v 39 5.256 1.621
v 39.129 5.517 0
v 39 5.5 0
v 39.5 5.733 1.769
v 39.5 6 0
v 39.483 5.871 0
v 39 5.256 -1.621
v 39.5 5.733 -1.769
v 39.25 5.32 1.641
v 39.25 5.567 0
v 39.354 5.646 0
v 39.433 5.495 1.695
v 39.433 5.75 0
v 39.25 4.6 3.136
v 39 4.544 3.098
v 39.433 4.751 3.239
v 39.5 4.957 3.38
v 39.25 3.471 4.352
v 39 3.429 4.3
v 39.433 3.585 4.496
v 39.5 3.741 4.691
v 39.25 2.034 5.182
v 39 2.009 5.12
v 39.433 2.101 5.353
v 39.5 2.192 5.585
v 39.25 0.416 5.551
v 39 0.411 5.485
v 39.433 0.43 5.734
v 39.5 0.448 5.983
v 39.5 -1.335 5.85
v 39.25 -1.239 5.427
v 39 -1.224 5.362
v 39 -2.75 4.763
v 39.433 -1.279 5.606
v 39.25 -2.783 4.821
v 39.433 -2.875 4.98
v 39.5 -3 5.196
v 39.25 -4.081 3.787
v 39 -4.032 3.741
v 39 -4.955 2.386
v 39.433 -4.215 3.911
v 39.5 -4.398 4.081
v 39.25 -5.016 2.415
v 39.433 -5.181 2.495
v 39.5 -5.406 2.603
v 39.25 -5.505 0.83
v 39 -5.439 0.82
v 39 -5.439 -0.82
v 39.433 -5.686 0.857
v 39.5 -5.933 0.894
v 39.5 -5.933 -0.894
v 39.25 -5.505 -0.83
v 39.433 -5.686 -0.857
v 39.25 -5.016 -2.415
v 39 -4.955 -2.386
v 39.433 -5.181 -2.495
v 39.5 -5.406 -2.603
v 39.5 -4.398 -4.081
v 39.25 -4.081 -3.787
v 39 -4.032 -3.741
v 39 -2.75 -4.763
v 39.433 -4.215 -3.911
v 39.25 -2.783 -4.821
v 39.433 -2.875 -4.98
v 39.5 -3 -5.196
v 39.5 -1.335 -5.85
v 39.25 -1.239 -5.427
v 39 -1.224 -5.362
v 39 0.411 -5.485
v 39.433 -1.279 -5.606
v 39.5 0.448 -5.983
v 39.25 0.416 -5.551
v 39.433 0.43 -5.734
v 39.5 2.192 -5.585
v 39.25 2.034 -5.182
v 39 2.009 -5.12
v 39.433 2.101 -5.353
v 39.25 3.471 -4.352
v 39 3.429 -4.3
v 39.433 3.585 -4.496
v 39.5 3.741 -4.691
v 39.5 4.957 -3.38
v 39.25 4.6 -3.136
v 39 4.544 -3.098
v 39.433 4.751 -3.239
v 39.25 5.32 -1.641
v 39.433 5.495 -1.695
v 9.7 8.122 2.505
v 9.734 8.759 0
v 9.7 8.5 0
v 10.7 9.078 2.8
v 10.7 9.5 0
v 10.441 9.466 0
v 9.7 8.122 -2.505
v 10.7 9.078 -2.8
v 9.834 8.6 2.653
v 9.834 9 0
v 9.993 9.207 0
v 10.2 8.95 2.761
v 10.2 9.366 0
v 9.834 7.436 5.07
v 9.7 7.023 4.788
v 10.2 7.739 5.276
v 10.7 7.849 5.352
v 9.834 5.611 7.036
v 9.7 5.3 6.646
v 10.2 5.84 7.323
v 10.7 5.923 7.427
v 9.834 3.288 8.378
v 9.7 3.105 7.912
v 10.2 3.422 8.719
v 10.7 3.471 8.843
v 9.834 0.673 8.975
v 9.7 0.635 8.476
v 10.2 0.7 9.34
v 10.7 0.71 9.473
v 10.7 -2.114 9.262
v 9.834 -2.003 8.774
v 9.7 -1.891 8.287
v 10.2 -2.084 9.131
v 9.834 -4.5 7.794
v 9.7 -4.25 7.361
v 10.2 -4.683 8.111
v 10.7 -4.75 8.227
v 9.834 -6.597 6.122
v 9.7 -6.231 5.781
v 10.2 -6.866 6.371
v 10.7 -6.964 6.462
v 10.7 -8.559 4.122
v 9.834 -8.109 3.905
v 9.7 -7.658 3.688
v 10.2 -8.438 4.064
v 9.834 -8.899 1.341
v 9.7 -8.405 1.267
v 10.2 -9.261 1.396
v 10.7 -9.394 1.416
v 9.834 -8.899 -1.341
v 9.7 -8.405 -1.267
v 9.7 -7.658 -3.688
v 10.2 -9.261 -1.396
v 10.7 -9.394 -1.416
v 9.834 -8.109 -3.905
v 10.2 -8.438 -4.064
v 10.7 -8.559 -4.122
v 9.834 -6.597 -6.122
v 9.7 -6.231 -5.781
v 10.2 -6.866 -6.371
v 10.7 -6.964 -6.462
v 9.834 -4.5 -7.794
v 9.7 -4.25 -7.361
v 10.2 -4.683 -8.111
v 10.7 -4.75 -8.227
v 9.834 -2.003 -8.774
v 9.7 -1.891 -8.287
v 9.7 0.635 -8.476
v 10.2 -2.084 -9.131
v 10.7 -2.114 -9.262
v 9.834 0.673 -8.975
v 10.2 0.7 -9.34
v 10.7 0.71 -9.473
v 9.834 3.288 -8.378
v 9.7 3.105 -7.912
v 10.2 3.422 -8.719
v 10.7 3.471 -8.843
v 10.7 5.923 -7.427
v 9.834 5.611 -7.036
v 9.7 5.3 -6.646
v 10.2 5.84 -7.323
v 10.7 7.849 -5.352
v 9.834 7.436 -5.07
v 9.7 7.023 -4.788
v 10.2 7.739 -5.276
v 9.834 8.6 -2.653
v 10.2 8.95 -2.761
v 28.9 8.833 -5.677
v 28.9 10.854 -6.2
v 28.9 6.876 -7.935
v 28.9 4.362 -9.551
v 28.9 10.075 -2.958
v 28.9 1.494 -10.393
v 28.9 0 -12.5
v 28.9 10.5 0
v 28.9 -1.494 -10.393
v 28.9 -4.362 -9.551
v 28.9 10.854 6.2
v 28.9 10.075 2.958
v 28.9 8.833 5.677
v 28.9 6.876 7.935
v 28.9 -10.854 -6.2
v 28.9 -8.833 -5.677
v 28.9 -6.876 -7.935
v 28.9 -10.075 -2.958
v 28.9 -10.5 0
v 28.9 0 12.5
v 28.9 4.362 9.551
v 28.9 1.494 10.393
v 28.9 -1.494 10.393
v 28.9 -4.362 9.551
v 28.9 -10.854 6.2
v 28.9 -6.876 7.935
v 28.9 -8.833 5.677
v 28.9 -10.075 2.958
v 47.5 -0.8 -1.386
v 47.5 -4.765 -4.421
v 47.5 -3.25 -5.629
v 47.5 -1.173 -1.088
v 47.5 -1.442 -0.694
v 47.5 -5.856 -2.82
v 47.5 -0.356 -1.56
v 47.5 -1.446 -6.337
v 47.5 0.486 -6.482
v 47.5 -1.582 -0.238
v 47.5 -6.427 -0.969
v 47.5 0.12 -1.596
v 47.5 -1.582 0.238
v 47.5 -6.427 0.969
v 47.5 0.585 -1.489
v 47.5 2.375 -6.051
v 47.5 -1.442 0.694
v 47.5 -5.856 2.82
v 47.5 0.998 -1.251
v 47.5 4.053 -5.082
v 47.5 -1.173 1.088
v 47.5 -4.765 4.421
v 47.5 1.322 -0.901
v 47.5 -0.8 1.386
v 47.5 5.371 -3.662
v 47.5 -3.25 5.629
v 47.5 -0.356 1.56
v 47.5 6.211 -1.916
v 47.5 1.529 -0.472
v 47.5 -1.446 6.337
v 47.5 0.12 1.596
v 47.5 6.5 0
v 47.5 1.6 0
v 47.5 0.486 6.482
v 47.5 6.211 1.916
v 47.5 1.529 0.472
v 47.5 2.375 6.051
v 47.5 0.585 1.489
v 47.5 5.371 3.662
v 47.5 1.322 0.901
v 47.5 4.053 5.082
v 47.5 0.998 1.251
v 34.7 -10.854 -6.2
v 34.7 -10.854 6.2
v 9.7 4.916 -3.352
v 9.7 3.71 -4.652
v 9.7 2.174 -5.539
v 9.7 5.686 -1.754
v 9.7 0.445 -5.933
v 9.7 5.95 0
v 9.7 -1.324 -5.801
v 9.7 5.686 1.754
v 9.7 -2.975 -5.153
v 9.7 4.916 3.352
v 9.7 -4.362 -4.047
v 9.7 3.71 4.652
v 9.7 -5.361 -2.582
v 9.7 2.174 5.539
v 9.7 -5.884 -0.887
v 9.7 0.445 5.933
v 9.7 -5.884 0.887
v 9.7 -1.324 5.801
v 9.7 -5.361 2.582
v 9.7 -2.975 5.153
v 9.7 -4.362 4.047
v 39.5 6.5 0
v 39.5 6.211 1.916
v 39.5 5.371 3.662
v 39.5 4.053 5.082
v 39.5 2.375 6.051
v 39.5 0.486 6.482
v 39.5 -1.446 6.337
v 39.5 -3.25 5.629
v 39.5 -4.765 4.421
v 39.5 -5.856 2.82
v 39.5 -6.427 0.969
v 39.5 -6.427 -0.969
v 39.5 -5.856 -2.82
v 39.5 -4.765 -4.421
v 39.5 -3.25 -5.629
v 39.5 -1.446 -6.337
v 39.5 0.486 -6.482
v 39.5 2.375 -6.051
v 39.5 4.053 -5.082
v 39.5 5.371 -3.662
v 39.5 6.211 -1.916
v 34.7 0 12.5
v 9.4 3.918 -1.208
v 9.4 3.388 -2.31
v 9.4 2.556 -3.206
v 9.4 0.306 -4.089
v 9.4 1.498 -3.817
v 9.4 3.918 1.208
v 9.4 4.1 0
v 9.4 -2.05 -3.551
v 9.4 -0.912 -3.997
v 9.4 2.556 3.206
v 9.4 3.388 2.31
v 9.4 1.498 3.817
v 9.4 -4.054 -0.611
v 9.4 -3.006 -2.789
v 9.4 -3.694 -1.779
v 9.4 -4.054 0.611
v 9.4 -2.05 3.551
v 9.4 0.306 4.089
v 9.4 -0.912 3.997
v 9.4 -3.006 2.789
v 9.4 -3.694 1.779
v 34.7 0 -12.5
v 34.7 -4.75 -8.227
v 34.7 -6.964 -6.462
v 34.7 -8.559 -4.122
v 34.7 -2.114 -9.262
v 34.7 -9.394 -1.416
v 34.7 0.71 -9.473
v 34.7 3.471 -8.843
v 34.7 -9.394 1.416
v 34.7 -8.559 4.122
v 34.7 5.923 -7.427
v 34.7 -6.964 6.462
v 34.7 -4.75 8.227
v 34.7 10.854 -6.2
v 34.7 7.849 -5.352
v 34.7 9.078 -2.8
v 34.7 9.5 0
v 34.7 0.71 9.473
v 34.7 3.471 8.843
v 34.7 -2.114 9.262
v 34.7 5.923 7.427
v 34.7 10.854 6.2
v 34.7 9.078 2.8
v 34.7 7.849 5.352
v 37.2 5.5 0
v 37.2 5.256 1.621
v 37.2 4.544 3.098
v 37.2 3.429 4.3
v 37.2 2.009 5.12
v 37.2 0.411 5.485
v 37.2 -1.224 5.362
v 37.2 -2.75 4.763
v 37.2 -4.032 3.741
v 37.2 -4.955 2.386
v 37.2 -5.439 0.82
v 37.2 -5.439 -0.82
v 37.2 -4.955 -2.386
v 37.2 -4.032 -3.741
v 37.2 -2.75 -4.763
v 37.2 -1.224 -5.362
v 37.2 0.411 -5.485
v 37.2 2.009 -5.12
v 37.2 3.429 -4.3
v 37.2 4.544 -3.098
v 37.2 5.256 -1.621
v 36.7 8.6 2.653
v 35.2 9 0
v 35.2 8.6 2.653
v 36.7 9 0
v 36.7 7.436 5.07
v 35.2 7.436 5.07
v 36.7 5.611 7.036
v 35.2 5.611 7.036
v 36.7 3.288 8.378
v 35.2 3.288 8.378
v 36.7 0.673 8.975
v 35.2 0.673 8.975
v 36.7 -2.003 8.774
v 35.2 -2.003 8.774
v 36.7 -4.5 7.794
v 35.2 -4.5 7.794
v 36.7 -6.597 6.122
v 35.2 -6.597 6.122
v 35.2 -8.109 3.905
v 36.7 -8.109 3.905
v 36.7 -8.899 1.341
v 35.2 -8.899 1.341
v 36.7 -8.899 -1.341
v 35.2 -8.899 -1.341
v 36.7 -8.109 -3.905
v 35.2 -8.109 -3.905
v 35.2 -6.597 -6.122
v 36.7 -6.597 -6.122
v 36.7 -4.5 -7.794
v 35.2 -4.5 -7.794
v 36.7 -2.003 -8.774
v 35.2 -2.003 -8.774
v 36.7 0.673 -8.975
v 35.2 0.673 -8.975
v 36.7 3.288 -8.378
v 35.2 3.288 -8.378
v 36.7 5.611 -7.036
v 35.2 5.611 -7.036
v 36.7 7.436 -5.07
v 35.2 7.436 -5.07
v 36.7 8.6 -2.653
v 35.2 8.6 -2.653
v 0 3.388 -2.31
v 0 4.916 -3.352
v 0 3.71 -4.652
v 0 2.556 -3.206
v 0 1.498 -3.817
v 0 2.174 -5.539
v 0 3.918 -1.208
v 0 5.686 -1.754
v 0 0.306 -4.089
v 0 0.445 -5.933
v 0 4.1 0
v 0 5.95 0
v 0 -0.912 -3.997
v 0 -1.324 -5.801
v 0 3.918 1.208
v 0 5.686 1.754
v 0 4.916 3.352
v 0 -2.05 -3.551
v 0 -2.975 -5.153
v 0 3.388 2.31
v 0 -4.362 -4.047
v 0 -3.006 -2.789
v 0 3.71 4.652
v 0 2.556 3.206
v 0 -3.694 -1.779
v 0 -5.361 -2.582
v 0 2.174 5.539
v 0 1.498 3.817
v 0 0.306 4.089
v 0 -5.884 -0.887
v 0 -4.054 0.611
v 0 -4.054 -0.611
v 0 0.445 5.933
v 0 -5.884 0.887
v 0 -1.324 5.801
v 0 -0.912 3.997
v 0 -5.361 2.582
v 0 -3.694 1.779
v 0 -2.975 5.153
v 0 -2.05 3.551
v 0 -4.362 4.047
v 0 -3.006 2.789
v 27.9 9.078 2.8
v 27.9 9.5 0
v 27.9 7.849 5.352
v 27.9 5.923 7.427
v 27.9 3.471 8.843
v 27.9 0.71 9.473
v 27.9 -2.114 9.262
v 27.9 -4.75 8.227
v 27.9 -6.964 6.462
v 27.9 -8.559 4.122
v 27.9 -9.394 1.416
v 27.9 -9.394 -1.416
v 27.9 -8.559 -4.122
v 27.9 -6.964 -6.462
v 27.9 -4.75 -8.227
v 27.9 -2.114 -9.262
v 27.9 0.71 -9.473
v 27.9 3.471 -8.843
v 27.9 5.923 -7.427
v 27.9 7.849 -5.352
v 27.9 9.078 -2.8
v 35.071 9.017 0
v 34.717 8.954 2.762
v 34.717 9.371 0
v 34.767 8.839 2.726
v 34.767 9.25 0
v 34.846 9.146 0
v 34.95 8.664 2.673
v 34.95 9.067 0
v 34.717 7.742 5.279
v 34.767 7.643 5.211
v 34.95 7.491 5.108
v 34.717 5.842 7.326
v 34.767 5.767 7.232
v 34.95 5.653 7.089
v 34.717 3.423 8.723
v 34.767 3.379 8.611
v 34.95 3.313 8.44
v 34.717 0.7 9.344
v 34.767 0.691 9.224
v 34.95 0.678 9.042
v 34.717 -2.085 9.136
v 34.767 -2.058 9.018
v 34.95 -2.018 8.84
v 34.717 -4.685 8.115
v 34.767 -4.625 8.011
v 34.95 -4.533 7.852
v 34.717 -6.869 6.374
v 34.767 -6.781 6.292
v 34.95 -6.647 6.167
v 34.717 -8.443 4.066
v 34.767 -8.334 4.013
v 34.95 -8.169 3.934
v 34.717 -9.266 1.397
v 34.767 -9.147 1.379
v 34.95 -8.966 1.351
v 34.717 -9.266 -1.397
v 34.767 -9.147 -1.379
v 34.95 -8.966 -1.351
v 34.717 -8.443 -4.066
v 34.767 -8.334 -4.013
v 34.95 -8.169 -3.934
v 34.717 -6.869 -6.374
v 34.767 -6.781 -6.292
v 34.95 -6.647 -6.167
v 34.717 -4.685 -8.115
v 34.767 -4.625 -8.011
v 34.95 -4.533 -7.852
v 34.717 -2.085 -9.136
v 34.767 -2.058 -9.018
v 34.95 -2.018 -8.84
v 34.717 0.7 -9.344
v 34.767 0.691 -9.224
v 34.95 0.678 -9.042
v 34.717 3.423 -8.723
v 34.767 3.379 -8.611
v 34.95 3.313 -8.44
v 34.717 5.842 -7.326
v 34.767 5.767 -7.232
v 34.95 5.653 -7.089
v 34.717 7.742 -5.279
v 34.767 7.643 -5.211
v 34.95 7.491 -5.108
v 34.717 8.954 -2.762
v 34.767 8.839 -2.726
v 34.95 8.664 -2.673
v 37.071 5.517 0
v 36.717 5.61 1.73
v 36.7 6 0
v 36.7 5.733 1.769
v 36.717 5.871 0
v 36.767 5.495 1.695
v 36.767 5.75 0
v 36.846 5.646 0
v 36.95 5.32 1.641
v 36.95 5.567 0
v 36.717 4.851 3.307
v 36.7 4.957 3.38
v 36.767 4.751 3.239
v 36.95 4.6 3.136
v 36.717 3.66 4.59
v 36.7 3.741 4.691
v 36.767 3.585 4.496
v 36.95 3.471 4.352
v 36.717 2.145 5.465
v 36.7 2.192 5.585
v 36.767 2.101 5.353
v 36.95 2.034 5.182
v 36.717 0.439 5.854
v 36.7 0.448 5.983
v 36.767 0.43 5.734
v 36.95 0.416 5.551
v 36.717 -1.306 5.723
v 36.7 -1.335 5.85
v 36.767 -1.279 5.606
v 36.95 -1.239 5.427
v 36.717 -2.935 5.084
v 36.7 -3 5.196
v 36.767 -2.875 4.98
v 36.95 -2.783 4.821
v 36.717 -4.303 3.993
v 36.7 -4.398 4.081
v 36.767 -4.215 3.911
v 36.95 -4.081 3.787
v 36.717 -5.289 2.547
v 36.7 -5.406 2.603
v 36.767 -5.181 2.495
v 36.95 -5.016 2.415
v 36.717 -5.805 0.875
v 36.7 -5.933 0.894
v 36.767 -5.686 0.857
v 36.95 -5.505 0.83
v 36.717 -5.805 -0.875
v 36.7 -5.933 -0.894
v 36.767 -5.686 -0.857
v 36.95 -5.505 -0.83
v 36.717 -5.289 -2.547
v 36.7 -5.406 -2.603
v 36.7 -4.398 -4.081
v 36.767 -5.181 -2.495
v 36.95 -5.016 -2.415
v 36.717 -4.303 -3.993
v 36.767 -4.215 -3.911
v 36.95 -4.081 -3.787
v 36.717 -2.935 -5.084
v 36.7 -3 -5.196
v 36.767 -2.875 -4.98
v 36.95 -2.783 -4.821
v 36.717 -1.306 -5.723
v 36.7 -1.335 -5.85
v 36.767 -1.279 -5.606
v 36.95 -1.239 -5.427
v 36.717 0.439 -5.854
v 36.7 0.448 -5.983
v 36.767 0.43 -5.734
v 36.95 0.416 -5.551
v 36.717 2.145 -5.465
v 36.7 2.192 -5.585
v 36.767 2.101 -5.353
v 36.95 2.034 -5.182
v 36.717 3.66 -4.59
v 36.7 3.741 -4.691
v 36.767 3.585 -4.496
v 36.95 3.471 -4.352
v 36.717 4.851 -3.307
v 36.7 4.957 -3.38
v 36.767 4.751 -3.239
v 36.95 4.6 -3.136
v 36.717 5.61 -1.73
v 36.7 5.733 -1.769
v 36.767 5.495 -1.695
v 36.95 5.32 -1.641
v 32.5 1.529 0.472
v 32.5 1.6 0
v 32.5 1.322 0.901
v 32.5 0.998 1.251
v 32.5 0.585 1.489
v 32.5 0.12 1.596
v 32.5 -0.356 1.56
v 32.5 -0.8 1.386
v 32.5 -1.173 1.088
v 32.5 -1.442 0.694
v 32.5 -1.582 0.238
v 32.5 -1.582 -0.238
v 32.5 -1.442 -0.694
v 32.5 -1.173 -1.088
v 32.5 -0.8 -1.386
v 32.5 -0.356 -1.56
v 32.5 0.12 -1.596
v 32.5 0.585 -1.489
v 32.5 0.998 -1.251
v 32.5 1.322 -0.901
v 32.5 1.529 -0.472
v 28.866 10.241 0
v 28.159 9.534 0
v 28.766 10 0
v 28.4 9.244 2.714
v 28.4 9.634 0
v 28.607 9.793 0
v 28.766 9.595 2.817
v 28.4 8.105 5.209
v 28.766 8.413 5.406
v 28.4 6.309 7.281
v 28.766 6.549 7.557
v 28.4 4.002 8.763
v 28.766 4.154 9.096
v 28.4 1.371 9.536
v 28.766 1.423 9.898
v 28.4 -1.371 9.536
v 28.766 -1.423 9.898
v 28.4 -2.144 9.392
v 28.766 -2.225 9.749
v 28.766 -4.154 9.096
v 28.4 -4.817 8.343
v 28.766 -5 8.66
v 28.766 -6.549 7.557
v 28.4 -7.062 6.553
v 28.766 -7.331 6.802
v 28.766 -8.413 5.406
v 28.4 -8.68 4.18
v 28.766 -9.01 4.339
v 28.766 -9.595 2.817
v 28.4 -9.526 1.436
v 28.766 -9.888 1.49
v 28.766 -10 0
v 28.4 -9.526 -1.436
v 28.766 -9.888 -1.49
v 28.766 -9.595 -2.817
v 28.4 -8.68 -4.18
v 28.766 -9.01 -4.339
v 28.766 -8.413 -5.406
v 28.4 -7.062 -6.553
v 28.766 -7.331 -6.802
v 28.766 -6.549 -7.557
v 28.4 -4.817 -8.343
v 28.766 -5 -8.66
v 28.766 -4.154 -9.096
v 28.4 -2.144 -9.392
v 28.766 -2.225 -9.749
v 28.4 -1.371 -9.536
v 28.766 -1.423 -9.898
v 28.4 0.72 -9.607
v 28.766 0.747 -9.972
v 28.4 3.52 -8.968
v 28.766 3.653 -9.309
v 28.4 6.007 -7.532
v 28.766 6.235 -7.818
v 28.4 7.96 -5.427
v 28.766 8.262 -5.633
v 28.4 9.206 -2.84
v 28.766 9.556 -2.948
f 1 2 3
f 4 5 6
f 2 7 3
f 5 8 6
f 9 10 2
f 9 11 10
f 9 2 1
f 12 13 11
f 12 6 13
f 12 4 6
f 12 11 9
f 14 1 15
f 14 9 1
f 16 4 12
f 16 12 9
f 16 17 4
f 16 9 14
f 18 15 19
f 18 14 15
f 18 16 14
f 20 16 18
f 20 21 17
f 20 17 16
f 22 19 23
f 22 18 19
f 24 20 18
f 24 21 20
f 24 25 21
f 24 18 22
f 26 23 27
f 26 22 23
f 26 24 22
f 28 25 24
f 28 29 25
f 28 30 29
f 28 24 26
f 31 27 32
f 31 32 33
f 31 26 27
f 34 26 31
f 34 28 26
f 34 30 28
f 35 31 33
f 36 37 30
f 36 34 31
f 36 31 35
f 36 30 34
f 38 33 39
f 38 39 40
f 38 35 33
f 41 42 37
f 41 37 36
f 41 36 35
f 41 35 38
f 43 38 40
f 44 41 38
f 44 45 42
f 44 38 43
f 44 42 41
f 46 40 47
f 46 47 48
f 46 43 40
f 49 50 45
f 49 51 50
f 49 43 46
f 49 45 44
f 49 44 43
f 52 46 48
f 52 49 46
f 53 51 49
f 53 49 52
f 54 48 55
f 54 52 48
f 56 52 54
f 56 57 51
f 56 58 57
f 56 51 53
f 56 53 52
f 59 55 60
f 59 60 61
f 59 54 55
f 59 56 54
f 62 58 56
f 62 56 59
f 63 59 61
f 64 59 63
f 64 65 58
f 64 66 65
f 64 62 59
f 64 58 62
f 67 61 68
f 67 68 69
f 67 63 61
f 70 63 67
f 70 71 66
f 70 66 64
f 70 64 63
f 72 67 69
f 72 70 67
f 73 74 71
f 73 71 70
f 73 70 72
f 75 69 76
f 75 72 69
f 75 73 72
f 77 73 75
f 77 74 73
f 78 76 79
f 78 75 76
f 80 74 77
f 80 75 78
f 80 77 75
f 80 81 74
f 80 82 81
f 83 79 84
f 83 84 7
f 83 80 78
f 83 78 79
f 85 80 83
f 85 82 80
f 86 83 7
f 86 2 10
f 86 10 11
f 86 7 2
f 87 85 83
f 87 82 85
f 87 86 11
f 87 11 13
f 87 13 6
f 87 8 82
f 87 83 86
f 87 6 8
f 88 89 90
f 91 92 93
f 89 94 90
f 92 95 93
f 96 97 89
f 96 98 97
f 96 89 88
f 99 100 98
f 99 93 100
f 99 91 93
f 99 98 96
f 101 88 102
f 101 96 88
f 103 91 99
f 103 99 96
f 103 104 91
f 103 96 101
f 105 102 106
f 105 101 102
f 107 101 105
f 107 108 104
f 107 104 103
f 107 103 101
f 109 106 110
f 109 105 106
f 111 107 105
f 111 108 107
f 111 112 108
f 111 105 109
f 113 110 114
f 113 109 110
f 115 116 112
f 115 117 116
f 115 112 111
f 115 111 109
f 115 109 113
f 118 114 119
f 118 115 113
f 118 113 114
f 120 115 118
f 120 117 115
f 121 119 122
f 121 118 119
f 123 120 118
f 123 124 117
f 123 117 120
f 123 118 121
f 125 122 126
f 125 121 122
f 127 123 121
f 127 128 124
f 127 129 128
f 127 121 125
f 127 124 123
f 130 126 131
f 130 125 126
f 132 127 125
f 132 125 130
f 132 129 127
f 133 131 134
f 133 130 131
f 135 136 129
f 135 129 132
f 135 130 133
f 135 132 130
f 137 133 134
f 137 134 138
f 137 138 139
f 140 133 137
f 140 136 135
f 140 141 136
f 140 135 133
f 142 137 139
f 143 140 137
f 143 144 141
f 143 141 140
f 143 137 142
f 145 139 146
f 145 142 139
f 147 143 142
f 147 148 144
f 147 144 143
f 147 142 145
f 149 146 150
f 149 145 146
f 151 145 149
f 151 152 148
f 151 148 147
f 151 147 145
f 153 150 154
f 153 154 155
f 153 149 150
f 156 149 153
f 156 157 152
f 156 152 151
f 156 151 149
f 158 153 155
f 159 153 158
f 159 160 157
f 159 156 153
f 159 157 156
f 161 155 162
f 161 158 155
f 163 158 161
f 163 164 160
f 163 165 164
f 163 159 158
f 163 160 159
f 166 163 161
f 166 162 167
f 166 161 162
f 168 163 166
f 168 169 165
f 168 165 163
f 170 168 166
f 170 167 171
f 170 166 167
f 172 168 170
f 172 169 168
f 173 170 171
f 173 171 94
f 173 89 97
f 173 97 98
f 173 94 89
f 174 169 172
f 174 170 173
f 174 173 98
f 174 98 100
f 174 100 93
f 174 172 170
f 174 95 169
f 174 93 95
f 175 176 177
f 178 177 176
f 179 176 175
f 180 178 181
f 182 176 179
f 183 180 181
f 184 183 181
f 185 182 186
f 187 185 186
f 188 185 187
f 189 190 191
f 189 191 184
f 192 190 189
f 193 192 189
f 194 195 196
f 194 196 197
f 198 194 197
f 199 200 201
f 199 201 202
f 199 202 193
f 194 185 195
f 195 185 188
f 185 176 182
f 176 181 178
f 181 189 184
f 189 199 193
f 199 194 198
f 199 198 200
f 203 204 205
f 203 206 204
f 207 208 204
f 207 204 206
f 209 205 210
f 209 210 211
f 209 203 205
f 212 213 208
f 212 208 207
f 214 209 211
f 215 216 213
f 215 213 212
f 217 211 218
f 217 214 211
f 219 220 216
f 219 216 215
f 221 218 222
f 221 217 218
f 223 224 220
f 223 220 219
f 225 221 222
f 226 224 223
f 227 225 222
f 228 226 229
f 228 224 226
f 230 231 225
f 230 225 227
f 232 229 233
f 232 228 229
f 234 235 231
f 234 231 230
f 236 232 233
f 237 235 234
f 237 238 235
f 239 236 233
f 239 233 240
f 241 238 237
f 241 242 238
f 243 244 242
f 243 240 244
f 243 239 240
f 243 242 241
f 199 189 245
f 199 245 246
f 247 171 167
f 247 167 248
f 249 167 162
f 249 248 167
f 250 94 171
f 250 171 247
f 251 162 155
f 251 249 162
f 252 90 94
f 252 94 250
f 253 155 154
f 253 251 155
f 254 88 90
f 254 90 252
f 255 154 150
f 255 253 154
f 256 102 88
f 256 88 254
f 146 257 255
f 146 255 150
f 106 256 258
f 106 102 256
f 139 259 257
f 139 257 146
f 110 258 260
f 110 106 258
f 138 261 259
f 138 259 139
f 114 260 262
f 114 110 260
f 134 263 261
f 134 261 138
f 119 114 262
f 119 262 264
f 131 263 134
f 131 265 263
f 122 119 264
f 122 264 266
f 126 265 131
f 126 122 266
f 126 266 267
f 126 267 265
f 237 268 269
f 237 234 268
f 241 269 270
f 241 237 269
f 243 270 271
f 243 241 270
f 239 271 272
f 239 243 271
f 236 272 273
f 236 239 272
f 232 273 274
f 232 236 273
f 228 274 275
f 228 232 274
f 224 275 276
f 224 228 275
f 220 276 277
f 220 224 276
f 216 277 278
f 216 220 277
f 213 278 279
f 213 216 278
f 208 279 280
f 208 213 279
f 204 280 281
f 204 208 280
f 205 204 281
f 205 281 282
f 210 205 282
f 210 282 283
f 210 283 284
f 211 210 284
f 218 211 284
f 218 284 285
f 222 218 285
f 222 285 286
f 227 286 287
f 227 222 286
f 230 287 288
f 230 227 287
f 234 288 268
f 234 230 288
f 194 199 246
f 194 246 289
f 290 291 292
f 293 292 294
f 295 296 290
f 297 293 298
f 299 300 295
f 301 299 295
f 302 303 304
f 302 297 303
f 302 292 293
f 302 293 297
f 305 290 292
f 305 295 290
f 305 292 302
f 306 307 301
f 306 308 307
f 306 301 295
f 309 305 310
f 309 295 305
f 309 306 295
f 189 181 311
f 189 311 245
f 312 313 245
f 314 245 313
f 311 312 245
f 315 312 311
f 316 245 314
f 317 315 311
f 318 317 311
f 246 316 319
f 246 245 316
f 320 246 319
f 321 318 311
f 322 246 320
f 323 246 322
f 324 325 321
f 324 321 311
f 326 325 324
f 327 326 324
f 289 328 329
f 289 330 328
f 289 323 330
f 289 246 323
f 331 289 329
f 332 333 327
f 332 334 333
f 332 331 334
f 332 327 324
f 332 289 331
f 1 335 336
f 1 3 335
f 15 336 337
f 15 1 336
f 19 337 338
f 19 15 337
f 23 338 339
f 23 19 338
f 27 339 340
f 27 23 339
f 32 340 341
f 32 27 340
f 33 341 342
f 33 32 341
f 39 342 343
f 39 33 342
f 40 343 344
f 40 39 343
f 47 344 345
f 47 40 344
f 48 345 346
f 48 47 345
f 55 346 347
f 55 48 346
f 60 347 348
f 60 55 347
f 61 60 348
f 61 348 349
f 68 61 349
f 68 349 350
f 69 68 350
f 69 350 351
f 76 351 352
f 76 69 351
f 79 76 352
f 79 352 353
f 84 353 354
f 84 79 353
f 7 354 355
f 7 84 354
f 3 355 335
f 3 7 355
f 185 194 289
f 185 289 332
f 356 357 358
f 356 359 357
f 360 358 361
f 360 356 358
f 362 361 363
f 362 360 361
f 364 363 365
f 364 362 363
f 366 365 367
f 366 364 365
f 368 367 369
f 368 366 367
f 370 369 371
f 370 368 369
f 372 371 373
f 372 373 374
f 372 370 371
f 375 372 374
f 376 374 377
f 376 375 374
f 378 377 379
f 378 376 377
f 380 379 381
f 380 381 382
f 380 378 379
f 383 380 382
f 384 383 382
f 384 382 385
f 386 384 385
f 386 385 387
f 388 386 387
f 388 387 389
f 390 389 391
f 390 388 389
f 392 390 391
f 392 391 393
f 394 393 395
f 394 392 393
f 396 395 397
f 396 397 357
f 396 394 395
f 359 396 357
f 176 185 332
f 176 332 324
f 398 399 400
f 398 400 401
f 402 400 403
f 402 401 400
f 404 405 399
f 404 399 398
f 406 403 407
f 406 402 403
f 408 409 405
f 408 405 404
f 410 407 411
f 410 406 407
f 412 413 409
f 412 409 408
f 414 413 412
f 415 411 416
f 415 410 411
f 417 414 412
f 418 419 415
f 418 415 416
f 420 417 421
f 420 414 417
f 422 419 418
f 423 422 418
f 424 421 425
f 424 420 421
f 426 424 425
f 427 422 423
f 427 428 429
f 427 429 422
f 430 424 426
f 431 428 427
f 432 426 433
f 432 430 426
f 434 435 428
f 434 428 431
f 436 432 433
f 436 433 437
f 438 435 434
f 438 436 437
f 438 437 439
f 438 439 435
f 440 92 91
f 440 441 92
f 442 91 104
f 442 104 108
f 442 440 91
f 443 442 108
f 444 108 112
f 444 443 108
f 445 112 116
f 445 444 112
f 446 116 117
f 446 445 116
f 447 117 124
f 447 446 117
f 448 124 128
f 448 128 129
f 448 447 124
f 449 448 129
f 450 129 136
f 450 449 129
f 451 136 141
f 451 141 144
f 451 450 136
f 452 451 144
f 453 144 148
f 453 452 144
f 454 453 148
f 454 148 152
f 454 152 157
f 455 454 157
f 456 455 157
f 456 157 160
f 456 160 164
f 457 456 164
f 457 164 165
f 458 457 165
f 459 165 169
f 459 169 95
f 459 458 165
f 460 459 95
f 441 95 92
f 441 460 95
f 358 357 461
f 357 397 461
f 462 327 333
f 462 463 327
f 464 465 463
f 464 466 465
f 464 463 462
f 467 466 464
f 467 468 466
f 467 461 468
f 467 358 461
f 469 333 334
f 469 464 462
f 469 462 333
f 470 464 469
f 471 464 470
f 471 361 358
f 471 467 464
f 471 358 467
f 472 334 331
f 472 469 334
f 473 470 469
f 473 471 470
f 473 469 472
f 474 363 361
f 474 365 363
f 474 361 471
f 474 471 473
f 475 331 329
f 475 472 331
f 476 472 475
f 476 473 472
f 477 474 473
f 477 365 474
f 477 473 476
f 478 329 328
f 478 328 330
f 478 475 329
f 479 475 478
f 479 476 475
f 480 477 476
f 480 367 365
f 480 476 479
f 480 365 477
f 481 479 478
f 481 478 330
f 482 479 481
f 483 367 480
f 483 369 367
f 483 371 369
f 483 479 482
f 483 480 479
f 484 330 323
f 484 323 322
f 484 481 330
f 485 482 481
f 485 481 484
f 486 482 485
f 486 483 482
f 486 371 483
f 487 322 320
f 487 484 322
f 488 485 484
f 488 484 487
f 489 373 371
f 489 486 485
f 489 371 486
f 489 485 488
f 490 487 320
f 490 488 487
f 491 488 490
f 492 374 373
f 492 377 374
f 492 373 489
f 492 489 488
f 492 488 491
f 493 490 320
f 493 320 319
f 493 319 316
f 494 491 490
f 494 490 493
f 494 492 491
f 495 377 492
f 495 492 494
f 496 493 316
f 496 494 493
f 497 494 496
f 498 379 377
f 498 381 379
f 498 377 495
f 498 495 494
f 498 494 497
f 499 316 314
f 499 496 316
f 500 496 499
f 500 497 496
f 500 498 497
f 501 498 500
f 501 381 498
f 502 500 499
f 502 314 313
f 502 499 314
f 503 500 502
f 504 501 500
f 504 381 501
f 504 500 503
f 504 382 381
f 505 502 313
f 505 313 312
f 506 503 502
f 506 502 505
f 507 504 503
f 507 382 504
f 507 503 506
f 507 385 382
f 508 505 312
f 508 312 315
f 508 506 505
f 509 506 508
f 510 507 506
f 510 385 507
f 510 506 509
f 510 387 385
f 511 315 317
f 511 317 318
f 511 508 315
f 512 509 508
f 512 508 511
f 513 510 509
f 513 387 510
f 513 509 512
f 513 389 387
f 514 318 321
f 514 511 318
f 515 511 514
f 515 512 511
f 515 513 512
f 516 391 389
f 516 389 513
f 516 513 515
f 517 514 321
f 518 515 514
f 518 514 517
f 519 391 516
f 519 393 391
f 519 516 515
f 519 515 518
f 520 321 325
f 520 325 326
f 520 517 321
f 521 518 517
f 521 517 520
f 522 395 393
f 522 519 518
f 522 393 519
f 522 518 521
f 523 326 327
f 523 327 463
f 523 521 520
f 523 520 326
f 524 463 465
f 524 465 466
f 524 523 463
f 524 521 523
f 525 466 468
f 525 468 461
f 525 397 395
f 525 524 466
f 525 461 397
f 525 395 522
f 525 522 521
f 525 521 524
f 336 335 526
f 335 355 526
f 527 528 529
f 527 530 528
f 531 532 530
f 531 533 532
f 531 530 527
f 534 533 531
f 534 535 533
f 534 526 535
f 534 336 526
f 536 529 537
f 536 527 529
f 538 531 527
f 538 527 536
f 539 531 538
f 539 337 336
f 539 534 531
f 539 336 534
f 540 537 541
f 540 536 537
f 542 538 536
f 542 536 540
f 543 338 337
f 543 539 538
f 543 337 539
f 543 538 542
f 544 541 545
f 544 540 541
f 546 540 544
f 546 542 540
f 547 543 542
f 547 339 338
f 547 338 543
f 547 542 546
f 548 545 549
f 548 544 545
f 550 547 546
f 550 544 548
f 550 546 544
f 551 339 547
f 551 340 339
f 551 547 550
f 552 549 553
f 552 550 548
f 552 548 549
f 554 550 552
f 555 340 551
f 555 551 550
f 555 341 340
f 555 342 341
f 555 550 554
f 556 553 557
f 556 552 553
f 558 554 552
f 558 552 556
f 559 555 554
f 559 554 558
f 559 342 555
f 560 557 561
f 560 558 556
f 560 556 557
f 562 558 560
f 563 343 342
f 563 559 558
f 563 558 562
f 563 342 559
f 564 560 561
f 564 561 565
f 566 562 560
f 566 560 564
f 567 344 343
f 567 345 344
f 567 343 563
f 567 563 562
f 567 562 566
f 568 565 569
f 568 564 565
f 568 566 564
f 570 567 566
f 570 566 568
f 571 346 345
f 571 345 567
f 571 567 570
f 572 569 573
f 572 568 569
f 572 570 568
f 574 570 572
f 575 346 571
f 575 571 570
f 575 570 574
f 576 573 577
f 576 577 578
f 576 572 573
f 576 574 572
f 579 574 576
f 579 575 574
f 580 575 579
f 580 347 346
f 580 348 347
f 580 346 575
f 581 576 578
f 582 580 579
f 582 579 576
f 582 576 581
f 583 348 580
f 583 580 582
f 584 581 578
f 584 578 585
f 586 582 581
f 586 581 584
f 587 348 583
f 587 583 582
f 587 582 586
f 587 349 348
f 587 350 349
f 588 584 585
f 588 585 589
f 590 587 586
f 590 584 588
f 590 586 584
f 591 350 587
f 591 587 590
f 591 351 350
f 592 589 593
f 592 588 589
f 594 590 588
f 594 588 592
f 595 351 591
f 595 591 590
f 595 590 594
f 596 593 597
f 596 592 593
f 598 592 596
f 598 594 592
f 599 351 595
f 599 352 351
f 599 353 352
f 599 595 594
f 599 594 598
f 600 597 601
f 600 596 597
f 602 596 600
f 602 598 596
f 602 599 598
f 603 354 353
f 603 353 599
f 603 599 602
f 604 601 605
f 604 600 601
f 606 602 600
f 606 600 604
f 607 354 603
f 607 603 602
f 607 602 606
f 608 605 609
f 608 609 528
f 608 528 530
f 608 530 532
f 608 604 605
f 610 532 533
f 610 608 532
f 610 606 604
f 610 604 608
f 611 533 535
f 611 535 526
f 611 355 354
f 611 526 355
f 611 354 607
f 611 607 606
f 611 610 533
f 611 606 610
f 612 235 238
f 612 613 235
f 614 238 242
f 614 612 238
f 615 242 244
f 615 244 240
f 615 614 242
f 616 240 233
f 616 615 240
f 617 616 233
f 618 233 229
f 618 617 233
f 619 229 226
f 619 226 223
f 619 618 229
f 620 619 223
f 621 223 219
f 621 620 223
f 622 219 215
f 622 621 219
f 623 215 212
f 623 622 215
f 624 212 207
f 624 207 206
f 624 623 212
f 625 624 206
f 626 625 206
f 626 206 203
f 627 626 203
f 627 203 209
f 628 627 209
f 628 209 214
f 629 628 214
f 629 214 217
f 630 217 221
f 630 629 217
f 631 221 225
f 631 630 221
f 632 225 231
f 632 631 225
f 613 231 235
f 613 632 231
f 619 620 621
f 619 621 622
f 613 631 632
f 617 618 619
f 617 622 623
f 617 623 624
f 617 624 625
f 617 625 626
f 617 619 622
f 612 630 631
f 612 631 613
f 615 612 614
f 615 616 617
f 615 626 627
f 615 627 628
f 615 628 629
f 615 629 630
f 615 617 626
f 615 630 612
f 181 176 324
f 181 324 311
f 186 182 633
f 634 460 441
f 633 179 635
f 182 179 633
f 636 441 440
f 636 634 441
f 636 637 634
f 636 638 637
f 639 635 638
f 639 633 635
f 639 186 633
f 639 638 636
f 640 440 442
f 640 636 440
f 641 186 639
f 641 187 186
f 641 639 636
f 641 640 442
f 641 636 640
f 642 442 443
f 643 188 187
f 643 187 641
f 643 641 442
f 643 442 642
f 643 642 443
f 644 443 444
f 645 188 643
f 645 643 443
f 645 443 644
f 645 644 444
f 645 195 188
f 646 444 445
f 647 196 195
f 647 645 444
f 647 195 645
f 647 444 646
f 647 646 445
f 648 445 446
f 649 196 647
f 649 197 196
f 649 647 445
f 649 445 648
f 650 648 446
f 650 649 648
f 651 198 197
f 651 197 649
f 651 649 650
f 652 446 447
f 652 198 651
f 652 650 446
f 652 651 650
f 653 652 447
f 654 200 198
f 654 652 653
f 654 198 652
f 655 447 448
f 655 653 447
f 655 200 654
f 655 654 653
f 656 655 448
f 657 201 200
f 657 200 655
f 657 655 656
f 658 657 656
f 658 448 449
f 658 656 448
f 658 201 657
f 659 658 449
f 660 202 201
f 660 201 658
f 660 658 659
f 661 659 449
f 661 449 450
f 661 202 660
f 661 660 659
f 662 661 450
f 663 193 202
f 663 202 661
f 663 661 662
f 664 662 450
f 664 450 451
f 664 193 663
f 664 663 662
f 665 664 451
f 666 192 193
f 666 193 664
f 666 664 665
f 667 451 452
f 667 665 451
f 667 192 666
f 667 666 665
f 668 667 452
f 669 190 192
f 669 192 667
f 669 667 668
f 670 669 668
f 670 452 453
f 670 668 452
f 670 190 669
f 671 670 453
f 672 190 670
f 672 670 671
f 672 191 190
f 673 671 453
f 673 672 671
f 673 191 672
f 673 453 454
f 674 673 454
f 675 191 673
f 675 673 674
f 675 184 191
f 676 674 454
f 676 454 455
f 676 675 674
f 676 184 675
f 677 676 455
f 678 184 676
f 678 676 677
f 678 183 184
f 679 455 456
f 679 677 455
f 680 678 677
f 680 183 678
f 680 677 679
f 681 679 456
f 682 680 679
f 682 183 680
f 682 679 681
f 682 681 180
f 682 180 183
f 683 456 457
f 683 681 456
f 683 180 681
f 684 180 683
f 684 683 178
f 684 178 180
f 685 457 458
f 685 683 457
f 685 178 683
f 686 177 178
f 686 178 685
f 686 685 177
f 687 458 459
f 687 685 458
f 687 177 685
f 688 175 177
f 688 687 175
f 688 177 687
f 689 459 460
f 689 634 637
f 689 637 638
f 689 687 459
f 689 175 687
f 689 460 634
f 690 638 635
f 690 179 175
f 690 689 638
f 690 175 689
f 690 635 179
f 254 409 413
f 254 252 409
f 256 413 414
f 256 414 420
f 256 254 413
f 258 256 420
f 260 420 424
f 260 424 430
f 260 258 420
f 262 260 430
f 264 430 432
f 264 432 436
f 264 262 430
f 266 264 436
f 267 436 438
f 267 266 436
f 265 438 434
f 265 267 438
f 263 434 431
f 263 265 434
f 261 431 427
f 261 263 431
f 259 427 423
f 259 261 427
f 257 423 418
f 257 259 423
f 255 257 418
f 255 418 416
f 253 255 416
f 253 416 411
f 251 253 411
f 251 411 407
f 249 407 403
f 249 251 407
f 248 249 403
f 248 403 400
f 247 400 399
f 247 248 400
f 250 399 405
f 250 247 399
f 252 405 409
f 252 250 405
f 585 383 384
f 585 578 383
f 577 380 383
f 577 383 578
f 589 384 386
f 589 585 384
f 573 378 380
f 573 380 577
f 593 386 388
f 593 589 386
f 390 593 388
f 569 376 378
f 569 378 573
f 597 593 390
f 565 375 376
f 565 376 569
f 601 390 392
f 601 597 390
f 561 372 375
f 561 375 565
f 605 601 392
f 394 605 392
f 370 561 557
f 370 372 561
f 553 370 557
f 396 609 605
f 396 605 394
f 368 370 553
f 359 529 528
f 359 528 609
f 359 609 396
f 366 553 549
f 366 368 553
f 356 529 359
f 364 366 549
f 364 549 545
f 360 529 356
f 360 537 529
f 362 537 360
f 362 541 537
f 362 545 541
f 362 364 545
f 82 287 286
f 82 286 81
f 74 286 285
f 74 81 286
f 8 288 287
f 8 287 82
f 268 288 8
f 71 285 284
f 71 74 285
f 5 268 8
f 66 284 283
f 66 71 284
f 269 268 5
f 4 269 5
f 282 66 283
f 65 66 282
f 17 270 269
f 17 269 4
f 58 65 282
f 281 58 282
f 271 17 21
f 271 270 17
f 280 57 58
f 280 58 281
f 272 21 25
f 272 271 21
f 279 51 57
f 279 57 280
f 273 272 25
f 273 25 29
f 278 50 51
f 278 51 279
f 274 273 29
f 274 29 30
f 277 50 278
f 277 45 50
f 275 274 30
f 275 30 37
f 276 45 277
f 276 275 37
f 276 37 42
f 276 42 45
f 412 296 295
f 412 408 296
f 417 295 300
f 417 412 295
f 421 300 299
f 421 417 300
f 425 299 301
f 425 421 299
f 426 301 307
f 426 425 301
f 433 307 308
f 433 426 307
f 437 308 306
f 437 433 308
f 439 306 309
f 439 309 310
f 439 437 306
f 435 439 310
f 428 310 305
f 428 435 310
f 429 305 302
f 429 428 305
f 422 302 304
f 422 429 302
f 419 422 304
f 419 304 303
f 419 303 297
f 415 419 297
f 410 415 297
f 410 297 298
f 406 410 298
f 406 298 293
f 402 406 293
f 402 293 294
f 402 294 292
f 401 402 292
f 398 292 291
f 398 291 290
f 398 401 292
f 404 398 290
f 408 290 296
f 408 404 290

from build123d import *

# Parameters (mm, degrees)
SKETCH2_OUTSIDE_W  = 38.842
SKETCH2_OUTSIDE_H  = 38.842
CUT_EXTRUDE1_DEPTH = 5.8


with BuildPart() as part:
    # Sketch1 → Revolve1 (revolve)
    with BuildSketch(Plane.XY):
        with BuildLine():
            Line((0, 4.1), (0, 5.95))
            Line((0, 5.95), (9.7, 5.95))
            Line((9.7, 5.95), (9.7, 8.5))
            ThreePointArc((9.7, 8.5), (9.992893219, 9.207106781), (10.7, 9.5))
            Line((10.7, 9.5), (27.9, 9.5))
            ThreePointArc((27.9, 9.5), (28.607106781, 9.792893219), (28.9, 10.5))
            Line((28.9, 10.5), (28.9, 12.5))
            Line((28.9, 12.5), (34.7, 12.5))
            Line((34.7, 12.5), (34.7, 9.5))
            ThreePointArc((34.7, 9.5), (34.846446609, 9.146446609), (35.2, 9))
            Line((35.2, 9), (36.7, 9))
            Line((36.7, 9), (36.7, 6.5))
            Line((36.7, 6.5), (36.7, 6))
            ThreePointArc((36.7, 6), (36.846446609, 5.646446609), (37.2, 5.5))
            Line((37.2, 5.5), (39, 5.5))
            ThreePointArc((39, 5.5), (39.353553391, 5.646446609), (39.5, 6))
            Line((39.5, 6), (39.5, 6.5))
            Line((39.5, 6.5), (47.5, 6.5))
            Line((47.5, 6.5), (47.5, 1.6))
            Line((47.5, 1.6), (32.5, 1.6))
            Line((32.5, 1.6), (32.5, 0))
            Line((32.5, 0), (9.4, 0))
            Line((9.4, 0), (9.4, 4.1))
            Line((9.4, 4.1), (0, 4.1))
        make_face()
    revolve(axis=Axis((0, 0, 0), (1, 0, 0)))

    # Sketch2 outside → Cut-Extrude1 (cut)
    with BuildSketch(Plane(origin=(28.9, 0, 0), x_dir=(0, 0, -1), z_dir=(1, 0, 0))):
        Rectangle(SKETCH2_OUTSIDE_W, SKETCH2_OUTSIDE_H)
        Polygon((6.2, 10.854031509), (12.5, 0), (6.2, -10.854031509), (-6.2, -10.854031509), (-12.5, 0), (-6.2, 10.854031509), align=None, mode=Mode.SUBTRACT)
    extrude(amount=CUT_EXTRUDE1_DEPTH, mode=Mode.SUBTRACT)


solid = part.part
